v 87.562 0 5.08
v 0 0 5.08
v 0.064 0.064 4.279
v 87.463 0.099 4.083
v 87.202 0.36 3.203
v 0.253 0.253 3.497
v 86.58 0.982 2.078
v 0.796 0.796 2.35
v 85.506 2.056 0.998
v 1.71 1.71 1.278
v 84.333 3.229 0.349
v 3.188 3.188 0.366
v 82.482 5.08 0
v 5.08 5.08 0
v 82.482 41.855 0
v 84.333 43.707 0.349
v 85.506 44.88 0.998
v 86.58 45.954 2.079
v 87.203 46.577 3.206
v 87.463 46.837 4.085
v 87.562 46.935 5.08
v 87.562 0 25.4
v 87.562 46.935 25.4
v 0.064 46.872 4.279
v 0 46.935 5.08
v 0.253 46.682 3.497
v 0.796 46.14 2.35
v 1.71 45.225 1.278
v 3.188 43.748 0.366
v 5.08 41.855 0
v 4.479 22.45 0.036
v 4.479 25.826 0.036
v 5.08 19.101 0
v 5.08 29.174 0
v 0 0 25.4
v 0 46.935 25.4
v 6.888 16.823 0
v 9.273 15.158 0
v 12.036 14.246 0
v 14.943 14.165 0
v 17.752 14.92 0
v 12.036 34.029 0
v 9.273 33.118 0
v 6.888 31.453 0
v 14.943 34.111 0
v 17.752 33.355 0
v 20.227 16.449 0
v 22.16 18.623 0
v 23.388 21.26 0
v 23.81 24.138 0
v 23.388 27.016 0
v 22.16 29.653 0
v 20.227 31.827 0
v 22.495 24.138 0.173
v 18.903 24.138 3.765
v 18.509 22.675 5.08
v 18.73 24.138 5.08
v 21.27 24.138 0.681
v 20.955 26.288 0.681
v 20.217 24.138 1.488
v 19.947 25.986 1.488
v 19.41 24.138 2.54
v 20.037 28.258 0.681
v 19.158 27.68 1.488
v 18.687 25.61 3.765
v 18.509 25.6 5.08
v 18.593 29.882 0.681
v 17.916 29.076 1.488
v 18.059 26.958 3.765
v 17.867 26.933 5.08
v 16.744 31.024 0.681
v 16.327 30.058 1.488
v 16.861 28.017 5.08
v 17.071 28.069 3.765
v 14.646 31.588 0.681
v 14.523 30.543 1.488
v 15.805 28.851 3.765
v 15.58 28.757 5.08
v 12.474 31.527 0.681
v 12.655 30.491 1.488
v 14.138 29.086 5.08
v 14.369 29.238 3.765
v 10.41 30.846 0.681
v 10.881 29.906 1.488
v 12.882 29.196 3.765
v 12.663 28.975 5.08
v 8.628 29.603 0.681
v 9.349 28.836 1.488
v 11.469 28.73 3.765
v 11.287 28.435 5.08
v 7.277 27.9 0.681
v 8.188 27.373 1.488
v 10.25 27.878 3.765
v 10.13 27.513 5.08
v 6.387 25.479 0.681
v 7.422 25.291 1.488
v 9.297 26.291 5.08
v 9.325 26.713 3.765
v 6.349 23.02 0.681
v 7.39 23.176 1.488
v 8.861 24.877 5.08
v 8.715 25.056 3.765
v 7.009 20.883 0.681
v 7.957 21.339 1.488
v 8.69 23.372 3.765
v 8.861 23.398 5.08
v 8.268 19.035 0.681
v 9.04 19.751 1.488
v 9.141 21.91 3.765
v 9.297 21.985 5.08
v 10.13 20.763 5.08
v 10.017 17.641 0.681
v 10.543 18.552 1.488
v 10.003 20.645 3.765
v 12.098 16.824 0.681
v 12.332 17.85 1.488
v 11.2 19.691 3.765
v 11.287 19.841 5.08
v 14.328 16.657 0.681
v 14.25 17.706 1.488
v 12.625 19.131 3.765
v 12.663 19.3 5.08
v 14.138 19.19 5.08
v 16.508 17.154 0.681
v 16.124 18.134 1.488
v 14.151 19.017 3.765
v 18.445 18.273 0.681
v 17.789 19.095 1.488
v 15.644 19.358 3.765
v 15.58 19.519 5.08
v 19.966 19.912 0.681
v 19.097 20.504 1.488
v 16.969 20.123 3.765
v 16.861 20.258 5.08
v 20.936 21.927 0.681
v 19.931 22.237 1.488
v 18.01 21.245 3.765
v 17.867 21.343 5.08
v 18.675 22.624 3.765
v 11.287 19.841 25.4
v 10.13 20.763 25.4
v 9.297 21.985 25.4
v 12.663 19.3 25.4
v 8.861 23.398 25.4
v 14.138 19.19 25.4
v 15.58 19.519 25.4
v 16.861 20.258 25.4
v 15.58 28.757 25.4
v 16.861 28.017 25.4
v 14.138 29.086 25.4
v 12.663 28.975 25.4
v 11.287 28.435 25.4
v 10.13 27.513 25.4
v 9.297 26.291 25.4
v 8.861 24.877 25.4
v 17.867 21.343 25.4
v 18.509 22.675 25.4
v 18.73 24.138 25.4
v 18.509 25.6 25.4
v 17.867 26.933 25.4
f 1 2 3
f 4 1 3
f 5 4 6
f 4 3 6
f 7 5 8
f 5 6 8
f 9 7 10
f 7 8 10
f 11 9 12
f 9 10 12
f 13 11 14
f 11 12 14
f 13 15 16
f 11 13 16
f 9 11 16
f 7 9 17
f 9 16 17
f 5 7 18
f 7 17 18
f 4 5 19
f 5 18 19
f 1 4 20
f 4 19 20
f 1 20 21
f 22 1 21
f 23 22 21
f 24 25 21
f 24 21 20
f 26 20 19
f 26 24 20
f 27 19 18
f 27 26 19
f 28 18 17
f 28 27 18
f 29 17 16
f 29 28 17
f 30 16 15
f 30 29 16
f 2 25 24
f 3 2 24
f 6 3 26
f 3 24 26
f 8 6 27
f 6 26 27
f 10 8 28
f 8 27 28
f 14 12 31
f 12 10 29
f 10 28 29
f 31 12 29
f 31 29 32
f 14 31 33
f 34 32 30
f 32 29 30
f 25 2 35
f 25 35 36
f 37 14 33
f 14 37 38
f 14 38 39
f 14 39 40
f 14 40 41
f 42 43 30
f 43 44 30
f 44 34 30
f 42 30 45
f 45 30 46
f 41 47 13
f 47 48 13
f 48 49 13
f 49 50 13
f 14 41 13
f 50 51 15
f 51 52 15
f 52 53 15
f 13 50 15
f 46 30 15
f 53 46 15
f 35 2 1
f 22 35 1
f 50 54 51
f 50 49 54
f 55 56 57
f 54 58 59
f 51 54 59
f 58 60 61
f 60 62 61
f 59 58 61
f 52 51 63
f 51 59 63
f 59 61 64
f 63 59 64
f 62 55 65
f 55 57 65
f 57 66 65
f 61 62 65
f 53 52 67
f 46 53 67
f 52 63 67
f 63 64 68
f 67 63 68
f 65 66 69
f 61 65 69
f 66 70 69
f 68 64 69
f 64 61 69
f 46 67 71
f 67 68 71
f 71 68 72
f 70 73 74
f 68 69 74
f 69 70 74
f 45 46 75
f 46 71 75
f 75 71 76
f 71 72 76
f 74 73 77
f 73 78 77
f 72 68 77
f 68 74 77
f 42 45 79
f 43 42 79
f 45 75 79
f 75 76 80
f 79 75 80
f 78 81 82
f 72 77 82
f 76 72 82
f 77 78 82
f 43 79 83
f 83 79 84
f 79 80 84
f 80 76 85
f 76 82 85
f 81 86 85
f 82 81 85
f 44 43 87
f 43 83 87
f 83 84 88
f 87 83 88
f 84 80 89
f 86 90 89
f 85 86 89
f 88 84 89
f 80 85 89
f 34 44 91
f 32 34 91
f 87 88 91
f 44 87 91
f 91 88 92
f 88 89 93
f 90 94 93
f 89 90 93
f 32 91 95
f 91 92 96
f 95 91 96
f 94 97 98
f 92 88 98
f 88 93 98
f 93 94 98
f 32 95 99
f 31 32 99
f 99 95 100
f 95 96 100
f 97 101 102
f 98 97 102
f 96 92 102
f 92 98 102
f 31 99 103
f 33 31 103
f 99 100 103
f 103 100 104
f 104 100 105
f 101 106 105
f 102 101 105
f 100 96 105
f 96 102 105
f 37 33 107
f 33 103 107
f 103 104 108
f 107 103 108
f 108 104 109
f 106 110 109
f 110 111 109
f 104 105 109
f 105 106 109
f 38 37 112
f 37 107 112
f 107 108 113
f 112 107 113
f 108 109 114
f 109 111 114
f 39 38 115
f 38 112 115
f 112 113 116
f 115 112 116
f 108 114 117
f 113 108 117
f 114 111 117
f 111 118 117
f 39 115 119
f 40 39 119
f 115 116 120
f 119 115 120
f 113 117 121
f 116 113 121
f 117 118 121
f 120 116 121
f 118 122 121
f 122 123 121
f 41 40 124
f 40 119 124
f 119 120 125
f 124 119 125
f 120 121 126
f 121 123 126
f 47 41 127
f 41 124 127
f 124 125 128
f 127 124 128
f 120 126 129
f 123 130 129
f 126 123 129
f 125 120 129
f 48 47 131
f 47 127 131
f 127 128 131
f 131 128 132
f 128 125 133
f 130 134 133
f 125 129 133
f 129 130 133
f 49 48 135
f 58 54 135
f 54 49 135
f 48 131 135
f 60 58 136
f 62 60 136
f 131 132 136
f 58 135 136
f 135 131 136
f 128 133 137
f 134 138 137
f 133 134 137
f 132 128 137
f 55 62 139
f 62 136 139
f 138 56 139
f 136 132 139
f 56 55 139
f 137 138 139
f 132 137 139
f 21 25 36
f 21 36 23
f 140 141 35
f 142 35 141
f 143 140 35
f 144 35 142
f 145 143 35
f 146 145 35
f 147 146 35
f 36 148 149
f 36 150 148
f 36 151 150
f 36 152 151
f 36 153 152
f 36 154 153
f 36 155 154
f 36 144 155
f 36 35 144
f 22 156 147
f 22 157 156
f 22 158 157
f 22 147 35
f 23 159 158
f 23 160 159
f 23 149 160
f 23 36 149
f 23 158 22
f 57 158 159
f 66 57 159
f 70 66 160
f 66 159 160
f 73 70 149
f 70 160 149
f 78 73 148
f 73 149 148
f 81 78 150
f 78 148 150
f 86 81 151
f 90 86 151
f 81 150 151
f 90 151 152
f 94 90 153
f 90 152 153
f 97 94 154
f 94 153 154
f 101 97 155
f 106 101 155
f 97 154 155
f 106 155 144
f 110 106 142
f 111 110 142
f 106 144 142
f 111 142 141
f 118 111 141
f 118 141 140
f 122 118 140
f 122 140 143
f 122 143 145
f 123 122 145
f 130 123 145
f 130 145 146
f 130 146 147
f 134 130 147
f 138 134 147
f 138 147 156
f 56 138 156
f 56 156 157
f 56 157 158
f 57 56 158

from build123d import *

# Parameters (mm, degrees)
F0_W        = 87.5617265701
F0_H        = 46.9353795052
F1_DEPTH    = 25.4
F2_R        = 4.9619580549
F3_DEPTH    = 25.4
F4_T1_DEPTH = 72.3353795052
F4_T3_DEPTH = 112.9617265701


# Not quite as in the source:
# - a fillet or chamfer that OpenCascade refuses, or shapes differently, is made with other operations: its cross-section is extruded or revolved along the edge and cut away or added


with BuildPart() as f1:
    # F0 (on Top) → F1 (new body)
    with BuildSketch(Plane.XY):
        with Locations((43.7808632851, 23.4676897526)):
            Rectangle(F0_W, F0_H)
    extrude(amount=F1_DEPTH)

    # F2 (on face) → F3 (cut)
    with BuildSketch(Plane.XY.offset(25.4)):
        with Locations((13.7676307932, 24.1377800703)):
            Circle(F2_R)
    extrude(amount=-F3_DEPTH, mode=Mode.SUBTRACT)

    # F4: fillet of radius 5.08 on 5 edges, made by hand

    # F4_s2 → F4_t1 (cut)
    with BuildSketch(Plane.XZ.offset(-59.6353795052)):
        with BuildLine():
            ThreePointArc((0, 5.08), (1.4878975516, 1.4878975516), (5.08, 0))
            Line((5.08, 0), (0, 0))
            Line((0, 0), (0, 5.08))
        make_face()
        with BuildLine():
            ThreePointArc((82.4817265701, 0), (86.0738290186, 1.4878975516), (87.5617265701, 5.08))
            Line((87.5617265701, 5.08), (87.5617265701, 0))
            Line((87.5617265701, 0), (82.4817265701, 0))
        make_face()
    extrude(amount=F4_T1_DEPTH, mode=Mode.SUBTRACT)

    # F4_s4 → F4_t3 (cut)
    with BuildSketch(Plane.YZ.offset(-12.7)):
        with BuildLine():
            ThreePointArc((46.9353795052, 5.08), (45.4474819536, 1.4878975516), (41.8553795052, 0))
            Line((41.8553795052, 0), (46.9353795052, 0))
            Line((46.9353795052, 0), (46.9353795052, 5.08))
        make_face()
        with BuildLine():
            ThreePointArc((0, 5.08), (1.4878975516, 1.4878975516), (5.08, 0))
            Line((5.08, 0), (0, 0))
            Line((0, 0), (0, 5.08))
        make_face()
    extrude(amount=F4_T3_DEPTH, mode=Mode.SUBTRACT)

    # F4_s5 → F4_t6 (revolve, cut)
    with BuildSketch(Plane.XZ.offset(-24.1377800703)):
        with BuildLine():
            ThreePointArc((23.809588848, 0), (20.2174863996, 1.4878975516), (18.729588848, 5.08))
            Line((18.729588848, 5.08), (18.729588848, 0))
            Line((18.729588848, 0), (23.809588848, 0))
        make_face()
    revolve(axis=Axis((13.7676307932, 24.1377800703, 0), (0, 0, 1)), mode=Mode.SUBTRACT)


solid = f1.part
